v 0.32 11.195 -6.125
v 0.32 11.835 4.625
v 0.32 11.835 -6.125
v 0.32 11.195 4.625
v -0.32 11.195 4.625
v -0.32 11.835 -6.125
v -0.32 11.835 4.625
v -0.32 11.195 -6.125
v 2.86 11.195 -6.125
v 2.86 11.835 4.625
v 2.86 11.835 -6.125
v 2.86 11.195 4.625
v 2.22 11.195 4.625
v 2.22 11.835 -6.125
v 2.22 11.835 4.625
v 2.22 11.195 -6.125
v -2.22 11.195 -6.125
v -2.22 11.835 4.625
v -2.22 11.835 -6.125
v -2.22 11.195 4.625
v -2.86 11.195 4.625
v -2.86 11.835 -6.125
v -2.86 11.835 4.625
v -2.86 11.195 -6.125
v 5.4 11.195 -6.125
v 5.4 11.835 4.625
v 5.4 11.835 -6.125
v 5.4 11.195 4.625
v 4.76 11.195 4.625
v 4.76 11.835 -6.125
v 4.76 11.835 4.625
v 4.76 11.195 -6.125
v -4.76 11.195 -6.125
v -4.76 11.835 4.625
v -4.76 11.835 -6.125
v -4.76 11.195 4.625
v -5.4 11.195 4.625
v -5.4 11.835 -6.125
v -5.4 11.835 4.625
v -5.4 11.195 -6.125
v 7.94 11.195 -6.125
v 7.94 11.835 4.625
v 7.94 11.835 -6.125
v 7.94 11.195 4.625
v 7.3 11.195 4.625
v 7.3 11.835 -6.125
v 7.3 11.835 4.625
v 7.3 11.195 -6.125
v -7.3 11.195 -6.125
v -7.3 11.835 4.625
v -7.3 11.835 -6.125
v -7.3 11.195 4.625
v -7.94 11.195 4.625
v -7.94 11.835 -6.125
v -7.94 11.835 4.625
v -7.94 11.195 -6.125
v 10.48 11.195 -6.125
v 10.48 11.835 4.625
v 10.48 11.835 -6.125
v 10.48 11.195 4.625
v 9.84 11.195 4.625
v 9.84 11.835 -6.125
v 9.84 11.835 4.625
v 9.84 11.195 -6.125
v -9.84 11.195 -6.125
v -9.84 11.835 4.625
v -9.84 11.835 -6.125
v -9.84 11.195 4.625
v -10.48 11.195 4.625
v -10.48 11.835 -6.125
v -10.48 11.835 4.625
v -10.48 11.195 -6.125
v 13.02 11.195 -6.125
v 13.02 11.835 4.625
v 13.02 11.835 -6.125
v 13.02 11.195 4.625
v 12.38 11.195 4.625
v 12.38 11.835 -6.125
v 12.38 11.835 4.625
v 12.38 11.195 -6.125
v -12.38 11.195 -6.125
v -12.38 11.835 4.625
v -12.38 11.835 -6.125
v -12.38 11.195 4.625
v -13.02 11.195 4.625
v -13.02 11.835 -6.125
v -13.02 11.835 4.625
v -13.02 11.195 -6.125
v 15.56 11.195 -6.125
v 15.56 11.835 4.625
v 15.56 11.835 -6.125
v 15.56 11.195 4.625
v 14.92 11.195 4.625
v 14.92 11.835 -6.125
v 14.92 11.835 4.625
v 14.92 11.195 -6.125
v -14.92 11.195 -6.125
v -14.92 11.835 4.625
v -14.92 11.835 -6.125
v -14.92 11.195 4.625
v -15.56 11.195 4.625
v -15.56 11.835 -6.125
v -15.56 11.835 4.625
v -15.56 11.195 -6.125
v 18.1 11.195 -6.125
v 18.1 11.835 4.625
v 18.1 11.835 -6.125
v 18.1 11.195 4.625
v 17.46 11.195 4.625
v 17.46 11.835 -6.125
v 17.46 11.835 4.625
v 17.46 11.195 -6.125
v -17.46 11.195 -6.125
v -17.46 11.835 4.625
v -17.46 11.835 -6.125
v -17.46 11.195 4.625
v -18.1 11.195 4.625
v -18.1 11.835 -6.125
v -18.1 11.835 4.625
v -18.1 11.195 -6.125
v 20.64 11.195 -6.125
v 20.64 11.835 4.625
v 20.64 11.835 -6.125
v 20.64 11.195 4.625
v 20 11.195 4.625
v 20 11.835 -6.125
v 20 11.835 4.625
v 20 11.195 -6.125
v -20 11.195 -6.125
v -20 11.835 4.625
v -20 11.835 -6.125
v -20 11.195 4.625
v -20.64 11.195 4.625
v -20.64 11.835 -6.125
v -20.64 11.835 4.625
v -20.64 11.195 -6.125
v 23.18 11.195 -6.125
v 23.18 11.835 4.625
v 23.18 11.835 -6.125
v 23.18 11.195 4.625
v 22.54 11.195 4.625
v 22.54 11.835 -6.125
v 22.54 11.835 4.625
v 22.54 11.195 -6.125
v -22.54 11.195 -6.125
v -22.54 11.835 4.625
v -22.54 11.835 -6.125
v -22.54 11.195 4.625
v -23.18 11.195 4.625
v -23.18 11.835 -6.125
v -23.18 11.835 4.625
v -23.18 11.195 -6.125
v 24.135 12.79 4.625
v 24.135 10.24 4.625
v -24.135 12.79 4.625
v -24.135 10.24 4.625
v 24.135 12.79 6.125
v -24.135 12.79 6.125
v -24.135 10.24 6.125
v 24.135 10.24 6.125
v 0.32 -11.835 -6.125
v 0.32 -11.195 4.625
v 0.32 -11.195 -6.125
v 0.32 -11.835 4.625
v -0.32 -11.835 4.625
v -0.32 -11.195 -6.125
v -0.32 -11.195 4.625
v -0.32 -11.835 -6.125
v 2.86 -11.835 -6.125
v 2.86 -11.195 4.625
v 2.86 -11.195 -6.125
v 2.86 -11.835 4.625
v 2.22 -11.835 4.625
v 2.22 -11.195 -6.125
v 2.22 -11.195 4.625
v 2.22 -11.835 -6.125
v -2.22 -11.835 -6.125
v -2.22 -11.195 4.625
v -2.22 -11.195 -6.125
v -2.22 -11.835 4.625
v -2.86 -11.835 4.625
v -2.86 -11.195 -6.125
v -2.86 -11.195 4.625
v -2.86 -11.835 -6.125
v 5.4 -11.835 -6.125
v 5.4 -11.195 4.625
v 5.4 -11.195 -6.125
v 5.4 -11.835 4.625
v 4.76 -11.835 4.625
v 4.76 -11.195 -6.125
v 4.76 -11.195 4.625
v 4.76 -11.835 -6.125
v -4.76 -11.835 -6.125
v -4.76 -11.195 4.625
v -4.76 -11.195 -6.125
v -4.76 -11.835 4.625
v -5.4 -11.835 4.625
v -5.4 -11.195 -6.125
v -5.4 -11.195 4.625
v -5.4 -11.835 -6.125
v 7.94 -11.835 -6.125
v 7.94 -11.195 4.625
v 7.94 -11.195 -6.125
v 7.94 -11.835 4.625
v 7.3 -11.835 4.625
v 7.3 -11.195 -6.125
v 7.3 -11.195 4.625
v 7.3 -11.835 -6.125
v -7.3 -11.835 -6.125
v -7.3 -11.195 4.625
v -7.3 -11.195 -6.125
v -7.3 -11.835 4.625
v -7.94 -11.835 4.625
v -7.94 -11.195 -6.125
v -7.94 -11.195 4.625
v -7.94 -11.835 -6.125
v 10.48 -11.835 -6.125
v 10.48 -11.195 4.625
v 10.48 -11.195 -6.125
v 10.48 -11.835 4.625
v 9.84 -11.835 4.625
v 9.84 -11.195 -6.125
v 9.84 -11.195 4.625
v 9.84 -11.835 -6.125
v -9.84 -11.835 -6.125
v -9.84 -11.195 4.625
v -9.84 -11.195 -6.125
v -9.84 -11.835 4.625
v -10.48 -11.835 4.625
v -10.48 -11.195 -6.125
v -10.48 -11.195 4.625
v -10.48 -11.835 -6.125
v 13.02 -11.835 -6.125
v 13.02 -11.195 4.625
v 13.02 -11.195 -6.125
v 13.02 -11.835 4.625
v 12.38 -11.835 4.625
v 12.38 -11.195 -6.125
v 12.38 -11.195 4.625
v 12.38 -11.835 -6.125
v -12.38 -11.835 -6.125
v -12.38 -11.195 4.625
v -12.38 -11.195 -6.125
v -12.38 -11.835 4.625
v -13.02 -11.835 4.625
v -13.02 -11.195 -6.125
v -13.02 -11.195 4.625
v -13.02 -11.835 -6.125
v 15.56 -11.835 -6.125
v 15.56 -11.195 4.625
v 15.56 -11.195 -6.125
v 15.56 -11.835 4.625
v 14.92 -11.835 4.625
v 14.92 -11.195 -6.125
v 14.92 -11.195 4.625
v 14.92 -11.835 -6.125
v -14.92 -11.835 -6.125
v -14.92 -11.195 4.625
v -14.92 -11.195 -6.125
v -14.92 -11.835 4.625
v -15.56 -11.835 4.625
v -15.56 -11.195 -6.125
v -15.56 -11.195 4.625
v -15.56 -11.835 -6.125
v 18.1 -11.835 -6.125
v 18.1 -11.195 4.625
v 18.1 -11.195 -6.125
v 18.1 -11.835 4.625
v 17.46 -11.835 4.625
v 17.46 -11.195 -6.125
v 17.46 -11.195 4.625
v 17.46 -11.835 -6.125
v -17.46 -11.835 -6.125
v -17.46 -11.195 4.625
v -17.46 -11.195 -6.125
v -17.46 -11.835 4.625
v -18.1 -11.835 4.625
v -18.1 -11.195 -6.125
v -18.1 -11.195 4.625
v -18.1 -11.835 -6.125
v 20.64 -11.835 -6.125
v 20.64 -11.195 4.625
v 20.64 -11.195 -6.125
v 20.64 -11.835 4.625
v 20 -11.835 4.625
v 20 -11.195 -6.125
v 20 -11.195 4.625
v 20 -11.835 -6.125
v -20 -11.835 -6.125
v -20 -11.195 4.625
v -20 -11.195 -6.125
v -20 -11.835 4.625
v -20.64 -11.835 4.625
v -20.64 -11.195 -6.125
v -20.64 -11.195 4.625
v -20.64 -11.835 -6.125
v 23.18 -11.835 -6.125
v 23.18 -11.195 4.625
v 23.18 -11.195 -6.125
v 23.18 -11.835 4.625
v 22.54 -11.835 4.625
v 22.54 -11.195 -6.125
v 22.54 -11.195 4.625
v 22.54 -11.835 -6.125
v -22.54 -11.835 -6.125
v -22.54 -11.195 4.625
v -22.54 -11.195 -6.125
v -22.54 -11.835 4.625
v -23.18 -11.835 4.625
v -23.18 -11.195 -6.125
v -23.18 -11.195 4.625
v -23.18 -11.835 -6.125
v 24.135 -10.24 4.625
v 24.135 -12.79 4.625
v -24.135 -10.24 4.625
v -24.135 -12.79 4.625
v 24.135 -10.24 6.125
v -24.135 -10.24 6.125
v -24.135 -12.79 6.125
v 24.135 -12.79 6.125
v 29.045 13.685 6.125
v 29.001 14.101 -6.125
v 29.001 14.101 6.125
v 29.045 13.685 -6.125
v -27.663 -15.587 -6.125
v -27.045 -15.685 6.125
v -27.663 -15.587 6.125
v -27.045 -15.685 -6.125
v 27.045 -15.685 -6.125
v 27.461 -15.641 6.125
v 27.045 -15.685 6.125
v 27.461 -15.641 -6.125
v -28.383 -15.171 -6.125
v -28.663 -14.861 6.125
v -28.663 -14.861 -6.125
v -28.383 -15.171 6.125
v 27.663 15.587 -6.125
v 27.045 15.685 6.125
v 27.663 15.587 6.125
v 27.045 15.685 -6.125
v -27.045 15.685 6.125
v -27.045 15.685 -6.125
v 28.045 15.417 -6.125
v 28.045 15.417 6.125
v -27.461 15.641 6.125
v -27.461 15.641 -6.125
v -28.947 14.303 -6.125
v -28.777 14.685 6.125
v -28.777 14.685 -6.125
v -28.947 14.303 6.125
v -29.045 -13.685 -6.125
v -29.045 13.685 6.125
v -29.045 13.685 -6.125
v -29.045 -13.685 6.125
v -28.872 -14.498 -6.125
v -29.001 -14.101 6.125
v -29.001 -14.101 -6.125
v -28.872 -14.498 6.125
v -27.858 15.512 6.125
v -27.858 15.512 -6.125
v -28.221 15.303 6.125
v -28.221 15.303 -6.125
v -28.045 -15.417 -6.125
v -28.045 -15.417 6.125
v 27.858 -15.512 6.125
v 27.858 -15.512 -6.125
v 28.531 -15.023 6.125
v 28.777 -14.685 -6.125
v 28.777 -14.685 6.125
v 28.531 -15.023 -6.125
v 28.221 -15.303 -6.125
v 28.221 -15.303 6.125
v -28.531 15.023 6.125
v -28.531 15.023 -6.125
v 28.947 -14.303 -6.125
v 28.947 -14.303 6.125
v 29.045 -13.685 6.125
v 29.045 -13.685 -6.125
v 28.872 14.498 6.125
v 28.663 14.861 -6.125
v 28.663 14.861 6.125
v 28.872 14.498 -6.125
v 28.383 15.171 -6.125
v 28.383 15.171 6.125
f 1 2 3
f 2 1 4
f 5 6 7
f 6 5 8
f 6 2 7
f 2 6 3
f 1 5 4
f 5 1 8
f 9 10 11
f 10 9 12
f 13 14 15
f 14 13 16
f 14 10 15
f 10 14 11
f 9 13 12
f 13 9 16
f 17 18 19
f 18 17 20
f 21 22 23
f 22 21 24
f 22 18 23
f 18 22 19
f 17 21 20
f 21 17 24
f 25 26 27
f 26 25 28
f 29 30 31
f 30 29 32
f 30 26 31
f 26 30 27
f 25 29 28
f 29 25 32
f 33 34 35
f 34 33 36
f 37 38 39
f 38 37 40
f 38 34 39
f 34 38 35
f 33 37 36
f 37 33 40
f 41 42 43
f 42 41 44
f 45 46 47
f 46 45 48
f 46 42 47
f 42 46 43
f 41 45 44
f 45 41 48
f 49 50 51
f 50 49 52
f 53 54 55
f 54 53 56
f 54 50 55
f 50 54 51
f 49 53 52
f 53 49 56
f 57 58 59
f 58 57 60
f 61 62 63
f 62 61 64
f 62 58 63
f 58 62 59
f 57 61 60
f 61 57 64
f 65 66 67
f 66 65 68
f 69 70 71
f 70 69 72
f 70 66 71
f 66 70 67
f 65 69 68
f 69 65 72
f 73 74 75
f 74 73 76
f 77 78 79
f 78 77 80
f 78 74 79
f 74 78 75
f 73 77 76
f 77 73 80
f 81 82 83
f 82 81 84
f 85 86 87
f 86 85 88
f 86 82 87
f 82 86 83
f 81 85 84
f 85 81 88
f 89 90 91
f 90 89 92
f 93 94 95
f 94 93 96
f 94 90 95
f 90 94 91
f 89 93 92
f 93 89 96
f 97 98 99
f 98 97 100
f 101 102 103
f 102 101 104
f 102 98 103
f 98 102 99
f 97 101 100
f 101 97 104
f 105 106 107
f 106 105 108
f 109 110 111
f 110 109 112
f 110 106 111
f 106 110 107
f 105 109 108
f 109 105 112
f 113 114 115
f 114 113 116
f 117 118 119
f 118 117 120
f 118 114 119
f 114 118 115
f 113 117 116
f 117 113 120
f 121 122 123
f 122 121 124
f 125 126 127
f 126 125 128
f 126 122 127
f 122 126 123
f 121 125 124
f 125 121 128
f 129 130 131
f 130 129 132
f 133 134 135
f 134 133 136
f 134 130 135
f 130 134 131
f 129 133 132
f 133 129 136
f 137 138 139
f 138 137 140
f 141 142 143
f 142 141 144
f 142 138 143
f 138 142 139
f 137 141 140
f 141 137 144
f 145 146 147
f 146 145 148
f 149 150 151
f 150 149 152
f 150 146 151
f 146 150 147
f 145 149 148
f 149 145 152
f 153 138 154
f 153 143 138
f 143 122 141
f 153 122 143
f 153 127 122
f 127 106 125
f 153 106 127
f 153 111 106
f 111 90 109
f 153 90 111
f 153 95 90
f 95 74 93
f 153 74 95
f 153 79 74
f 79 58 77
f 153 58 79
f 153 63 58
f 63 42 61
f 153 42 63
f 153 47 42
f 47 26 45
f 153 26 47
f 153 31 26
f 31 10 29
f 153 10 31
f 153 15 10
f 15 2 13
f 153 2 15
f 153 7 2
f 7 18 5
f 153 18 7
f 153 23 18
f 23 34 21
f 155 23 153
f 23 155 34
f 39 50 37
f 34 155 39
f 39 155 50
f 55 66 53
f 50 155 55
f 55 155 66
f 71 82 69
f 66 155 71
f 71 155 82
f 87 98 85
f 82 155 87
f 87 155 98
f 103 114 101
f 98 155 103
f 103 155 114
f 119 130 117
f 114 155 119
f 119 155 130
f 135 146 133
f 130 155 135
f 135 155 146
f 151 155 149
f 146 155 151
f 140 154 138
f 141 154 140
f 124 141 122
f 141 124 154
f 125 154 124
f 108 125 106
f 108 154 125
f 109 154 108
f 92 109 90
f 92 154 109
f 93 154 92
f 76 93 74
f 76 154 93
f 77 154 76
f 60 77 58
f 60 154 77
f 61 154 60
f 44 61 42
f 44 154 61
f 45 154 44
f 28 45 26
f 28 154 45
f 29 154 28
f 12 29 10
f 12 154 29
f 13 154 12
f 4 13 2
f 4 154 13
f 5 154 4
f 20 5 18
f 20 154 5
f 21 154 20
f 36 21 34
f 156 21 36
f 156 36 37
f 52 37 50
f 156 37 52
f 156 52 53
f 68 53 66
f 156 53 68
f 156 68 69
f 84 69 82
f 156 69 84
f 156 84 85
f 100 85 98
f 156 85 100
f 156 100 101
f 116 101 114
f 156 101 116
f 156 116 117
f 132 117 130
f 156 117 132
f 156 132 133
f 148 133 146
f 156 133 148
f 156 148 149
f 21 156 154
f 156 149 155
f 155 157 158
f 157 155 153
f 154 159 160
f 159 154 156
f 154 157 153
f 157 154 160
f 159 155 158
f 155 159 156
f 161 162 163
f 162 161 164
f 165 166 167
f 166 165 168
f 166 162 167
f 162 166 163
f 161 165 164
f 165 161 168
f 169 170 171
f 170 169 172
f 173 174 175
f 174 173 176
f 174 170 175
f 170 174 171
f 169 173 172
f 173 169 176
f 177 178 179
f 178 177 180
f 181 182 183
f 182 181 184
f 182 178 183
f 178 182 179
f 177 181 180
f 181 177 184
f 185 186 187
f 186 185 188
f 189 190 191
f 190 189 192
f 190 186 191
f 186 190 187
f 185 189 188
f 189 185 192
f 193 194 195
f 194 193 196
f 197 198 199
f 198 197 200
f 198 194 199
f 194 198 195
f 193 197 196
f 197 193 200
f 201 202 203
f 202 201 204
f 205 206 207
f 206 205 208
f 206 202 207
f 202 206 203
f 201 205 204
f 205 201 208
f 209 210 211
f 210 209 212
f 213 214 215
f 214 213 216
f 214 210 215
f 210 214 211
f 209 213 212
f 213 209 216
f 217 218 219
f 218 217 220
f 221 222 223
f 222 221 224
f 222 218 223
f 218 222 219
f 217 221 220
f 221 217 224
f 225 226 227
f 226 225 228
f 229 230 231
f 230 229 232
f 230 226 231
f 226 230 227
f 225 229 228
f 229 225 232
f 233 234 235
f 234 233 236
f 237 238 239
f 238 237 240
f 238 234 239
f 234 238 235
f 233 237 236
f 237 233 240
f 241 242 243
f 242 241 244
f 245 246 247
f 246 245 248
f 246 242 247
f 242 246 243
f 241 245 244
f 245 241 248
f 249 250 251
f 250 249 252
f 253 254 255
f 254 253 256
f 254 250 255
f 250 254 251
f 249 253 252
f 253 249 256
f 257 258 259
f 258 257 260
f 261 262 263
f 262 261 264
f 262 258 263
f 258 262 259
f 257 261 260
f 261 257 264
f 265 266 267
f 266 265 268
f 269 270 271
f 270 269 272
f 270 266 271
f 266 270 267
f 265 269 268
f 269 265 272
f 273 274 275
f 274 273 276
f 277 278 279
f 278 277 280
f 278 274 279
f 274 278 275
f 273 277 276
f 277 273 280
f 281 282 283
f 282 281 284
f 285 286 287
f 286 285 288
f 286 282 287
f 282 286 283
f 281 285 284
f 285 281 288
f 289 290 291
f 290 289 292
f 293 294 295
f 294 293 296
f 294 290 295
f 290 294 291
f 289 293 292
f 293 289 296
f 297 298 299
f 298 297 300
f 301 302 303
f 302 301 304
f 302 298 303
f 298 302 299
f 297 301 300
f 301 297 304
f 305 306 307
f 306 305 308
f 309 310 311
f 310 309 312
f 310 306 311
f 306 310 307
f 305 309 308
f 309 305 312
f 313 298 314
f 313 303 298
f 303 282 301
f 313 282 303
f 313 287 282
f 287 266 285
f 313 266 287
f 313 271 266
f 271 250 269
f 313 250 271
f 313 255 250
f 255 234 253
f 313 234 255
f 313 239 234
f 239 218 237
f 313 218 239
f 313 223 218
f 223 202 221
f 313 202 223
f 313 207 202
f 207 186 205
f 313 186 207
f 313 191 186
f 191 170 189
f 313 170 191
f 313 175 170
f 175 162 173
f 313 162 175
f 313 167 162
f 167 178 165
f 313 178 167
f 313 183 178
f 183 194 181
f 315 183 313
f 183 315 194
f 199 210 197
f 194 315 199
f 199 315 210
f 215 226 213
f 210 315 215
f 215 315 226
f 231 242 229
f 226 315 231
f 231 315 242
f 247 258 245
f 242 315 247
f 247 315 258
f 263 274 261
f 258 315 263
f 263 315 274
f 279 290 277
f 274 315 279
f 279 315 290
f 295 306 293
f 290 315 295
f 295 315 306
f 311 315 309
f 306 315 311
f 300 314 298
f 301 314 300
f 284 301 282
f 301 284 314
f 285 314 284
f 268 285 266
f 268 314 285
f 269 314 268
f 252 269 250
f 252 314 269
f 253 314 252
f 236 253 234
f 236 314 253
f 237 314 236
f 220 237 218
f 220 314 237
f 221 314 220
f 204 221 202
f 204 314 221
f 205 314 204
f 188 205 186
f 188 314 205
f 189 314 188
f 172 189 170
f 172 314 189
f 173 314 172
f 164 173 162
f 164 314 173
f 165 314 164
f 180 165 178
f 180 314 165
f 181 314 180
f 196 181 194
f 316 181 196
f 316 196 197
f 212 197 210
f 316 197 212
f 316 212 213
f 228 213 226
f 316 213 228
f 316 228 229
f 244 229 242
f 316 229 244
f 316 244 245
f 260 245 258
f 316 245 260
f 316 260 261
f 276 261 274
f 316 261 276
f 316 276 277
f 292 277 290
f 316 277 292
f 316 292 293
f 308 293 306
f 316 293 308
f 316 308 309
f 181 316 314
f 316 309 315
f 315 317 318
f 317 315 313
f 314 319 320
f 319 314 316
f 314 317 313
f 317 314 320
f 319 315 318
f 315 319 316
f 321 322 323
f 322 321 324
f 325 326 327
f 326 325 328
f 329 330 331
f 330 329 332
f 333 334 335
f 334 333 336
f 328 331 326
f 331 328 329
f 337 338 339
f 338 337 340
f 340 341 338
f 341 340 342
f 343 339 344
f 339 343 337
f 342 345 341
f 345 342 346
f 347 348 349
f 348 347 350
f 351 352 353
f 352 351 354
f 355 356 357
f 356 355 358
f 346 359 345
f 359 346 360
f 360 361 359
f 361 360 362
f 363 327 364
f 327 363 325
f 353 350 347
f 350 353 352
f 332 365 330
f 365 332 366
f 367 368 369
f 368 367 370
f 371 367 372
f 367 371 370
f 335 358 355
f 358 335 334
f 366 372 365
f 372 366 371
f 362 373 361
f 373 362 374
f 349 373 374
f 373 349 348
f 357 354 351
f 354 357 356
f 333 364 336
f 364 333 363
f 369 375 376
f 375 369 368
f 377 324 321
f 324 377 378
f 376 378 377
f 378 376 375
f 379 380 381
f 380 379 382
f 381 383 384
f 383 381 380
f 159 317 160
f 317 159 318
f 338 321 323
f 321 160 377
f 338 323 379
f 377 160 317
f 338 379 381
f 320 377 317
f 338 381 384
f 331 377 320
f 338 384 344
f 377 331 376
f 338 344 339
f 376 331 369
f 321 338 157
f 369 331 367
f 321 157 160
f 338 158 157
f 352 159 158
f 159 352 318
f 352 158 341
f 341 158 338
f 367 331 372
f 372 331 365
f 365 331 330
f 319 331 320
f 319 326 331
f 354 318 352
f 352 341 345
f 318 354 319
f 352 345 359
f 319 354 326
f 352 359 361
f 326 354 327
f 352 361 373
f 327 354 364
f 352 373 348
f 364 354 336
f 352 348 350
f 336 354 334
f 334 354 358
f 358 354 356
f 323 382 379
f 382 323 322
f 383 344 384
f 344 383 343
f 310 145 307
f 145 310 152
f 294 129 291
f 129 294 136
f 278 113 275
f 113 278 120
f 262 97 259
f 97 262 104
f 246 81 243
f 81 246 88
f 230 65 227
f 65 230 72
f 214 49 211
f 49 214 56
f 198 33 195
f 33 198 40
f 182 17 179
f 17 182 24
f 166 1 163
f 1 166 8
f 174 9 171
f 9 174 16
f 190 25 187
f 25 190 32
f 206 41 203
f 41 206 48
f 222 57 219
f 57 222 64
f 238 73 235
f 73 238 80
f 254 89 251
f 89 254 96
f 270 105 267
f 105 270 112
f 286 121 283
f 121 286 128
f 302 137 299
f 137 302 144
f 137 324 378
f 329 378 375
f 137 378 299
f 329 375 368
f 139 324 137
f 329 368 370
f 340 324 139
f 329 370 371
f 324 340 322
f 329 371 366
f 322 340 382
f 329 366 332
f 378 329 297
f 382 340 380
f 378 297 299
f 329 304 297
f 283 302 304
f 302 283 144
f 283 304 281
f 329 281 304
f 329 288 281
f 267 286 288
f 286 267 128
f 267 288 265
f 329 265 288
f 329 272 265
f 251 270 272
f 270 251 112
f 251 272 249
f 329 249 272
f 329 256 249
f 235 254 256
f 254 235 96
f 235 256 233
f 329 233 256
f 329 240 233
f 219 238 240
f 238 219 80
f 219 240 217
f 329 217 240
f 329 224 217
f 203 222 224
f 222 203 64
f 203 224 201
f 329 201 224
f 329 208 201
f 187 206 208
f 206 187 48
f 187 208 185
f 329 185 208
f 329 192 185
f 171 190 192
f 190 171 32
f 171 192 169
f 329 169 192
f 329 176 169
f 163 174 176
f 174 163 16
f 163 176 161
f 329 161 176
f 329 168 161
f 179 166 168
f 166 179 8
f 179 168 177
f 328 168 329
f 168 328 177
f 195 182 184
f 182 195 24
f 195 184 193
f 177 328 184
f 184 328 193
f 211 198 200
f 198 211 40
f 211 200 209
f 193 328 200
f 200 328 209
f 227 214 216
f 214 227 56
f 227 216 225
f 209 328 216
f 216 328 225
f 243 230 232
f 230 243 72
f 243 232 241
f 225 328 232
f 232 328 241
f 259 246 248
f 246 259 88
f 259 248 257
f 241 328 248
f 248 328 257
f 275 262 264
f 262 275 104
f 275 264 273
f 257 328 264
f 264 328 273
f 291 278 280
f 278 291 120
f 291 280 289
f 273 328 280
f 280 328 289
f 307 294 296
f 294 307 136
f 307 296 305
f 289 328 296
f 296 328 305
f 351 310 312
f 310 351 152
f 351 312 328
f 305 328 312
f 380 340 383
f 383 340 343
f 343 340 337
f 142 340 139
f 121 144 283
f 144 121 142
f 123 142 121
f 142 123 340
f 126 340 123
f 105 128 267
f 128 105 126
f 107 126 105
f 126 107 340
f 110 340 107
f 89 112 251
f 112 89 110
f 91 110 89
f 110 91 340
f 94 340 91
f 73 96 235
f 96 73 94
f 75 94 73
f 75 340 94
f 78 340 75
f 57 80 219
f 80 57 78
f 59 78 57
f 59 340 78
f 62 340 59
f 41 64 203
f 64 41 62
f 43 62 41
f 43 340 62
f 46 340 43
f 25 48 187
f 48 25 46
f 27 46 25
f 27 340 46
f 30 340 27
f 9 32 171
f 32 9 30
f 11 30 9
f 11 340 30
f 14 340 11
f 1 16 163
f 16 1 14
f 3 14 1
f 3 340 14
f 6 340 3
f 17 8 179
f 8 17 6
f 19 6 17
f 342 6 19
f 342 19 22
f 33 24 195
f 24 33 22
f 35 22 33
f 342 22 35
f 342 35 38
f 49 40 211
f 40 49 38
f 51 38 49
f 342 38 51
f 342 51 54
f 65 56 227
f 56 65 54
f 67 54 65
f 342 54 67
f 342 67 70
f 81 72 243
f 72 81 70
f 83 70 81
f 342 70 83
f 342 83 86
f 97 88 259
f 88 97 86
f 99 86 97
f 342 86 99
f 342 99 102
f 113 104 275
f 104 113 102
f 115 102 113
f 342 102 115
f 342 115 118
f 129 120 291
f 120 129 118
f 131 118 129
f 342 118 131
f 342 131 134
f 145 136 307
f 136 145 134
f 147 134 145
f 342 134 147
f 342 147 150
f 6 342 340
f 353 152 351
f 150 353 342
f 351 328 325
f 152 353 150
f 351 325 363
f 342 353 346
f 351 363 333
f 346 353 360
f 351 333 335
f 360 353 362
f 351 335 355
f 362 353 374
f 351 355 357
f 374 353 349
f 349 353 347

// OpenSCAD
// file: myTools.scad
module tube (r = 0, d = 0, l = 0, 
            thick = 0, 
            bCentered = true, 
            taper_pct = 0, 
            circlip = false) // r=radius d=dia l=length 
{
    assert( r != 0 || d != 0, "specify one of radius or diameter");
    assert( l != 0 , "tube: need length 'l' to be non zero");
    assert( thick != 0, "wall thickness cannot be zero");

    punch = $preview ? .2 : 0; // stop funny view artifact

    dia = r ? r * 2 : d;

    od = ((thick > 0) ? dia + thick * 2 : dia);
    id = (thick > 0) ? dia             : dia  + thick *2; 

    
    
    if (thick > 0)
        echo ("tube\tMIN id = ", id, "od = ", od, "wall = ", thick, "center= ", bCentered);
    else
        echo ("tube\tMAX od = ", od, "id = ", id, "wall = ", thick, "center= ", bCentered);

    echo ("tube\tHeigth = ", l);
        
    if (taper_pct != 0)
    {
        echo ("tube\t*** OD expanded by ", taper_pct, "%, : bottom od = ", od * (1. +taper_pct/100), "top od = ", od);
    }
    
    assert(dia || dia < 0, "tube : missing r or d ");
    
    // if taper_pct specified, the base will always be closest to 0,0,0
    translate([ 0, 0, taper_pct == 0 ? 0: bCentered ? l/2:l  ])
    rotate([0, taper_pct == 0 ? 0 : 180, 0 ])

    difference()
    {
        // make a reese's cup
        {
            color("YELLOW", .3)
            linear_extrude(height= l, scale = 1 + taper_pct/100)
                difference()
                {
                    circle(d = od);
                    circle(d = .5);
                }
        }
    
     // hollow out reessed cup
     color("GREEN")
     translate([0, 0, -punch/2])
     linear_extrude(height= l+ punch*2, $fn=100)
     {
        circle(d = id);
        if (circlip) #square([1 + punch, od ]);
     }
    
    }
}
//==============================================================================
        
module abox (dims, 
            thick = 0, 
            bCentered = true, 
            round_out = 0, 
            round_in = 0, 
            bSolid = false,
            bHollow = false,
            elevator = 0)   // move bottom up by X
{
    punch = $preview ? .1 : 0; // stop funny view artifact
    
    assert(thick != 0, "Thick must be specified. +=outside dim, -= inside dims");
    assert(dims.z > thick, "wall thickness too large for depth of box");

    wall2 = abs(thick) * 2; // 2 walls in each direction
    wall = wall2 / 2;
    
    // box either grows inward (thick < 0) or outward (thick > 0)  from dims
    fat = dims + [ wall2, wall2, wall];
    thin = dims - [ wall2, wall2, wall];
    
    offset = (thick > 0 && bCentered == false) ? wall : 0;
    
    //echo ("abox : adjusting x,y,z by ", offset, " to move origin from  center to 0,0,0");
    translate( [ bCentered ? 0 : dims.x /2 + offset, bCentered ? 0 : dims.y /2 + offset, bCentered ? 0 : dims.z /2 + offset/2]) 
    {
        if (thick > 0)
        {   
            // wall grows outwards from users dim
            echo ("making a box, MAX INSIDE dim = ", dims, "a wall=", thick, "mm ... max outside = ", fat, " mm");
        }
        else
        {
            // wall grows inward from users dime
            echo ("making a box, MAX OUTSIDE dim = ", dims, "a wall=", thick, "mm ... min inside = ", thin, " mm");
        }
        
        // linear extrude alway works in the positive x/y plane an goes upward.
        // after calc, re-center about 0,0,0 where a bCentered cube would be
        
        translate([ 0, 0, thick > 0  ? -fat.z/2 : -dims.z/2 ])
        difference()
        {
            echo ("round_out = ", round_out);

            // MAKE SOLID BOX --------------------------------------
            router_outside = round_out ? round_out : 0;
            x = thick > 0  ? fat.x - router_outside : dims.x - router_outside;
            y = thick > 0  ? fat.y - router_outside : dims.y - router_outside;


            // MAKE PUCHNED INSIDE
            // using 'offset' it will add r on all dimensions, then round., 
            // so now you have fatter perimeter than you started with :(
            //  but at least the corners are round.
            
            // Compensate by shrinking dimension by r, 
            // and then by calling offset, offset will then add it back

            color("YELLOW", .2)

            linear_extrude(thick > 0  ? fat.z : dims.z)
            if (round_out)
            {
                offset( r= round_out, $fn=30)
                square( [x - router_outside, y - router_outside], true);
            }
            else square( [x - router_outside, y - router_outside], true);
           
            // time to punch out the inside if requested.
            if (bSolid == false)
            {
                hollow_offset = bHollow ? fat.z/2 + .2  : dims.z/2 +.2;
                // punching out inside. its either dims or thin.
                router_inside = round_in;
                echo ("round_in = ", router_inside);
                xi = thick > 0  ? dims.x  : thin.x;
                yi = thick > 0  ? dims.y : thin.y ;

                color("GREEN")

                // move 'punch' up if you need a bottom else zero (hollowed out)

                translate([ 0,0, bHollow ? -.1 : wall + elevator]) 
                linear_extrude(thick > 0  ? fat.z - wall  + hollow_offset : dims.z - wall + hollow_offset)
                //#linear_extrude(fat.z - wall  + hollow_offset)
                
                if (round_in) 
                {
                    offset( r= round_in, $fn=30)
                    square( [ xi - router_inside, yi - router_inside], true);
                }
                else
                    square( [ xi, yi], true);
            }
        }
    }
 }


// 50x25x10 box walls grow inward (-2). on center origin midpoint
// rounded outside (default), sharp corner inside(default), bCentered about 0,0,0
//color("GREEN", .9)
//abox([50,25, 10], -2, true); 


// 50x25x10 box walls grow inward (-2). on center origin midpoint
// sharp outside corners, rounded inside corners. Sit on x,y plane
color("BLUE", .9)
abox([50,20, 10], +2, round_in=2, bCentered = false);  // 50x25x10 box inside dim origin has 0,0


// 50x25x10 box walls grow inward (-2). on center origin midpoint
// sharp corners inside and out. sits on x,y plane
color("GREY", .9)//
translate([ 55, 0, 0])      
abox([50,20, 10], +2, round_out=3, false);

color("PINK", .9)//
translate([ 115, 10, 10])      
abox([86.66, 56.865, 5], -5, bHollow = true, bCentered = false); 

color("GREEN", .9)//
translate([ 140, 10, -10])      
abox([86.66, 56.865, 5], 3, bHollow = true, bCentered = false); 

/*
// 50x25x10 box walls grow inward (-2). on center origin midpoint
// round corners outside and SOLID
color("BLUE", .9)//
translate([ 55, 0, 0])      
abox([50,25, 10], +2, round_out=2, round_in=0, false, bSolid = true); // 50x25x10 box outside dim origin is 0,0
*/

//translate ([-30,-30, 0])
{
/*
    // tube outer dia  20, inner dia = (20 - 8)
    color("PINK")
    tube (d = 20, l = 20, thick = -8, bCentered = false);

    // tube, inner dia = (2* 10), outer dia = ((2*10) + 2) 
    color("PURPLE", .3)
    tube (r = 10, l = 20, thick = +2, bCentered= true);
*/
/*
    tube (d = 60, l = 20, thick = -6, bCentered = false);

    translate([0, 0, 50])
    tube (d = 60, l = 20, thick = -6, bCentered = false, taper_pct = 20, circlip = true);
    //color("GREEN")
    //tube (d = 20, l = 20, thick = -2, bCentered = false, taper = 10, circlip = true);
*/

}
// main file
//use <otherPeoplesWork/threads-scad/threads.scad>
use <myTools.scad>

/* [Hidden] */
TWEAK=.25;

x = 48.09 + 4;  // so we can pop it out if we have to.
y = 25.37;  // tight
z = 9 + TWEAK ;  // it will sit on its pins.   

$fn=60;   //circle quantize 360/10=36 degrees per side


//--------------------------------------------------------------------------------

PIN_WIDTH = .64;
PIN_HEIGTH = 20;
RUN = 46.12 - PIN_WIDTH;
NUM_PINS = 19;
PIN_DIST = .1 * 25.4;
echo ("PIN_DIST= ", PIN_DIST, "   PIN_DIST_IN =", PIN_DIST/25.4);

//--------------------------------------------------
module column_of_pins()
{
    
    for (drill = [0: 1: (NUM_PINS -1)/2]) 
    {
        echo ("drill at ", drill * PIN_DIST);
        translate([ drill * PIN_DIST, 0, 0])
        cube([PIN_WIDTH, PIN_WIDTH, PIN_HEIGTH], center=true);

        translate([ drill * -PIN_DIST, 0, 0])
        cube([PIN_WIDTH, PIN_WIDTH, PIN_HEIGTH], center=true);
    }
}
//--------------------------------------------------
POST_WIDTH=2.55;

module column_of_posts()
{
    
    for (drill = [0: 1: (NUM_PINS -1)/2]) 
    {
        echo ("drill at ", drill * PIN_DIST);
        translate([ drill * PIN_DIST, 0, z/2 + POST_WIDTH/2])
        cube([POST_WIDTH, POST_WIDTH, POST_WIDTH], center=true);

        translate([ -drill * PIN_DIST, 0, z/2 + POST_WIDTH/2])
        cube([POST_WIDTH, POST_WIDTH, POST_WIDTH], center=true);
    }
}
//--------------------------------------------------

module make_dip()
{
    WIDE= 23.67 - PIN_WIDTH;
    
    translate([ 0, +WIDE/2, 0])
    {
        column_of_pins();
        column_of_posts();
    }
    
    translate([ 0, -WIDE/2, 0])
    {
        column_of_pins();
        column_of_posts();
    }
}

//--------------------------------------------------------------------------------

// container for the AQ
Wave_insideDIM = [ x, y, z ];


DIA = 4;
BN_DIA = 2;
DIST = DIA + BN_DIA;
LENGTH= x * 1.2;
WALL = 3;

across =5;  // must be odd
down = 11;     // must be odd

difference()
{
    abox( Wave_insideDIM, thick = +WALL, round_out =2, bCentered = true, bSolid=true);
    make_dip();
}

/*
module oneRowX(ACROSS, DOWN)
{
    centerDot_x = (ACROSS -1) /2;
    //echo("centerDot_x is ", centerDot_x + 1);
    translate([ -(centerDot_x) * DIST, 0, 0 ])
    for ( ac = [ 0: 1: ACROSS -1 ])
        //echo ("ac = ", ac)
        translate([ ac * (DIST), 0, -LENGTH/2 ])
            cylinder( d= DIA, h= LENGTH, center= false);
}


module makeArray(ACROSS, DOWN, ROTATE)
for (dn = [ 0: 1: (DOWN -1)/2])
{
    rotate(ROTATE)
    translate ([0, dn * (DIST), 0]) // make postive row
        oneRowX(ACROSS);

    rotate(ROTATE)
    translate ([0, -dn * DIST, 0])  // mirror negative row
        oneRowX(ACROSS);
}

difference()
{
    abox( Wave_insideDIM, thick = +4, round_out =2, bCentered = true);
 
//    makeArray(across, down, [0, 90, 0]);
//    makeArray(13 , 5, [90, 0, 0]);
}
*/
